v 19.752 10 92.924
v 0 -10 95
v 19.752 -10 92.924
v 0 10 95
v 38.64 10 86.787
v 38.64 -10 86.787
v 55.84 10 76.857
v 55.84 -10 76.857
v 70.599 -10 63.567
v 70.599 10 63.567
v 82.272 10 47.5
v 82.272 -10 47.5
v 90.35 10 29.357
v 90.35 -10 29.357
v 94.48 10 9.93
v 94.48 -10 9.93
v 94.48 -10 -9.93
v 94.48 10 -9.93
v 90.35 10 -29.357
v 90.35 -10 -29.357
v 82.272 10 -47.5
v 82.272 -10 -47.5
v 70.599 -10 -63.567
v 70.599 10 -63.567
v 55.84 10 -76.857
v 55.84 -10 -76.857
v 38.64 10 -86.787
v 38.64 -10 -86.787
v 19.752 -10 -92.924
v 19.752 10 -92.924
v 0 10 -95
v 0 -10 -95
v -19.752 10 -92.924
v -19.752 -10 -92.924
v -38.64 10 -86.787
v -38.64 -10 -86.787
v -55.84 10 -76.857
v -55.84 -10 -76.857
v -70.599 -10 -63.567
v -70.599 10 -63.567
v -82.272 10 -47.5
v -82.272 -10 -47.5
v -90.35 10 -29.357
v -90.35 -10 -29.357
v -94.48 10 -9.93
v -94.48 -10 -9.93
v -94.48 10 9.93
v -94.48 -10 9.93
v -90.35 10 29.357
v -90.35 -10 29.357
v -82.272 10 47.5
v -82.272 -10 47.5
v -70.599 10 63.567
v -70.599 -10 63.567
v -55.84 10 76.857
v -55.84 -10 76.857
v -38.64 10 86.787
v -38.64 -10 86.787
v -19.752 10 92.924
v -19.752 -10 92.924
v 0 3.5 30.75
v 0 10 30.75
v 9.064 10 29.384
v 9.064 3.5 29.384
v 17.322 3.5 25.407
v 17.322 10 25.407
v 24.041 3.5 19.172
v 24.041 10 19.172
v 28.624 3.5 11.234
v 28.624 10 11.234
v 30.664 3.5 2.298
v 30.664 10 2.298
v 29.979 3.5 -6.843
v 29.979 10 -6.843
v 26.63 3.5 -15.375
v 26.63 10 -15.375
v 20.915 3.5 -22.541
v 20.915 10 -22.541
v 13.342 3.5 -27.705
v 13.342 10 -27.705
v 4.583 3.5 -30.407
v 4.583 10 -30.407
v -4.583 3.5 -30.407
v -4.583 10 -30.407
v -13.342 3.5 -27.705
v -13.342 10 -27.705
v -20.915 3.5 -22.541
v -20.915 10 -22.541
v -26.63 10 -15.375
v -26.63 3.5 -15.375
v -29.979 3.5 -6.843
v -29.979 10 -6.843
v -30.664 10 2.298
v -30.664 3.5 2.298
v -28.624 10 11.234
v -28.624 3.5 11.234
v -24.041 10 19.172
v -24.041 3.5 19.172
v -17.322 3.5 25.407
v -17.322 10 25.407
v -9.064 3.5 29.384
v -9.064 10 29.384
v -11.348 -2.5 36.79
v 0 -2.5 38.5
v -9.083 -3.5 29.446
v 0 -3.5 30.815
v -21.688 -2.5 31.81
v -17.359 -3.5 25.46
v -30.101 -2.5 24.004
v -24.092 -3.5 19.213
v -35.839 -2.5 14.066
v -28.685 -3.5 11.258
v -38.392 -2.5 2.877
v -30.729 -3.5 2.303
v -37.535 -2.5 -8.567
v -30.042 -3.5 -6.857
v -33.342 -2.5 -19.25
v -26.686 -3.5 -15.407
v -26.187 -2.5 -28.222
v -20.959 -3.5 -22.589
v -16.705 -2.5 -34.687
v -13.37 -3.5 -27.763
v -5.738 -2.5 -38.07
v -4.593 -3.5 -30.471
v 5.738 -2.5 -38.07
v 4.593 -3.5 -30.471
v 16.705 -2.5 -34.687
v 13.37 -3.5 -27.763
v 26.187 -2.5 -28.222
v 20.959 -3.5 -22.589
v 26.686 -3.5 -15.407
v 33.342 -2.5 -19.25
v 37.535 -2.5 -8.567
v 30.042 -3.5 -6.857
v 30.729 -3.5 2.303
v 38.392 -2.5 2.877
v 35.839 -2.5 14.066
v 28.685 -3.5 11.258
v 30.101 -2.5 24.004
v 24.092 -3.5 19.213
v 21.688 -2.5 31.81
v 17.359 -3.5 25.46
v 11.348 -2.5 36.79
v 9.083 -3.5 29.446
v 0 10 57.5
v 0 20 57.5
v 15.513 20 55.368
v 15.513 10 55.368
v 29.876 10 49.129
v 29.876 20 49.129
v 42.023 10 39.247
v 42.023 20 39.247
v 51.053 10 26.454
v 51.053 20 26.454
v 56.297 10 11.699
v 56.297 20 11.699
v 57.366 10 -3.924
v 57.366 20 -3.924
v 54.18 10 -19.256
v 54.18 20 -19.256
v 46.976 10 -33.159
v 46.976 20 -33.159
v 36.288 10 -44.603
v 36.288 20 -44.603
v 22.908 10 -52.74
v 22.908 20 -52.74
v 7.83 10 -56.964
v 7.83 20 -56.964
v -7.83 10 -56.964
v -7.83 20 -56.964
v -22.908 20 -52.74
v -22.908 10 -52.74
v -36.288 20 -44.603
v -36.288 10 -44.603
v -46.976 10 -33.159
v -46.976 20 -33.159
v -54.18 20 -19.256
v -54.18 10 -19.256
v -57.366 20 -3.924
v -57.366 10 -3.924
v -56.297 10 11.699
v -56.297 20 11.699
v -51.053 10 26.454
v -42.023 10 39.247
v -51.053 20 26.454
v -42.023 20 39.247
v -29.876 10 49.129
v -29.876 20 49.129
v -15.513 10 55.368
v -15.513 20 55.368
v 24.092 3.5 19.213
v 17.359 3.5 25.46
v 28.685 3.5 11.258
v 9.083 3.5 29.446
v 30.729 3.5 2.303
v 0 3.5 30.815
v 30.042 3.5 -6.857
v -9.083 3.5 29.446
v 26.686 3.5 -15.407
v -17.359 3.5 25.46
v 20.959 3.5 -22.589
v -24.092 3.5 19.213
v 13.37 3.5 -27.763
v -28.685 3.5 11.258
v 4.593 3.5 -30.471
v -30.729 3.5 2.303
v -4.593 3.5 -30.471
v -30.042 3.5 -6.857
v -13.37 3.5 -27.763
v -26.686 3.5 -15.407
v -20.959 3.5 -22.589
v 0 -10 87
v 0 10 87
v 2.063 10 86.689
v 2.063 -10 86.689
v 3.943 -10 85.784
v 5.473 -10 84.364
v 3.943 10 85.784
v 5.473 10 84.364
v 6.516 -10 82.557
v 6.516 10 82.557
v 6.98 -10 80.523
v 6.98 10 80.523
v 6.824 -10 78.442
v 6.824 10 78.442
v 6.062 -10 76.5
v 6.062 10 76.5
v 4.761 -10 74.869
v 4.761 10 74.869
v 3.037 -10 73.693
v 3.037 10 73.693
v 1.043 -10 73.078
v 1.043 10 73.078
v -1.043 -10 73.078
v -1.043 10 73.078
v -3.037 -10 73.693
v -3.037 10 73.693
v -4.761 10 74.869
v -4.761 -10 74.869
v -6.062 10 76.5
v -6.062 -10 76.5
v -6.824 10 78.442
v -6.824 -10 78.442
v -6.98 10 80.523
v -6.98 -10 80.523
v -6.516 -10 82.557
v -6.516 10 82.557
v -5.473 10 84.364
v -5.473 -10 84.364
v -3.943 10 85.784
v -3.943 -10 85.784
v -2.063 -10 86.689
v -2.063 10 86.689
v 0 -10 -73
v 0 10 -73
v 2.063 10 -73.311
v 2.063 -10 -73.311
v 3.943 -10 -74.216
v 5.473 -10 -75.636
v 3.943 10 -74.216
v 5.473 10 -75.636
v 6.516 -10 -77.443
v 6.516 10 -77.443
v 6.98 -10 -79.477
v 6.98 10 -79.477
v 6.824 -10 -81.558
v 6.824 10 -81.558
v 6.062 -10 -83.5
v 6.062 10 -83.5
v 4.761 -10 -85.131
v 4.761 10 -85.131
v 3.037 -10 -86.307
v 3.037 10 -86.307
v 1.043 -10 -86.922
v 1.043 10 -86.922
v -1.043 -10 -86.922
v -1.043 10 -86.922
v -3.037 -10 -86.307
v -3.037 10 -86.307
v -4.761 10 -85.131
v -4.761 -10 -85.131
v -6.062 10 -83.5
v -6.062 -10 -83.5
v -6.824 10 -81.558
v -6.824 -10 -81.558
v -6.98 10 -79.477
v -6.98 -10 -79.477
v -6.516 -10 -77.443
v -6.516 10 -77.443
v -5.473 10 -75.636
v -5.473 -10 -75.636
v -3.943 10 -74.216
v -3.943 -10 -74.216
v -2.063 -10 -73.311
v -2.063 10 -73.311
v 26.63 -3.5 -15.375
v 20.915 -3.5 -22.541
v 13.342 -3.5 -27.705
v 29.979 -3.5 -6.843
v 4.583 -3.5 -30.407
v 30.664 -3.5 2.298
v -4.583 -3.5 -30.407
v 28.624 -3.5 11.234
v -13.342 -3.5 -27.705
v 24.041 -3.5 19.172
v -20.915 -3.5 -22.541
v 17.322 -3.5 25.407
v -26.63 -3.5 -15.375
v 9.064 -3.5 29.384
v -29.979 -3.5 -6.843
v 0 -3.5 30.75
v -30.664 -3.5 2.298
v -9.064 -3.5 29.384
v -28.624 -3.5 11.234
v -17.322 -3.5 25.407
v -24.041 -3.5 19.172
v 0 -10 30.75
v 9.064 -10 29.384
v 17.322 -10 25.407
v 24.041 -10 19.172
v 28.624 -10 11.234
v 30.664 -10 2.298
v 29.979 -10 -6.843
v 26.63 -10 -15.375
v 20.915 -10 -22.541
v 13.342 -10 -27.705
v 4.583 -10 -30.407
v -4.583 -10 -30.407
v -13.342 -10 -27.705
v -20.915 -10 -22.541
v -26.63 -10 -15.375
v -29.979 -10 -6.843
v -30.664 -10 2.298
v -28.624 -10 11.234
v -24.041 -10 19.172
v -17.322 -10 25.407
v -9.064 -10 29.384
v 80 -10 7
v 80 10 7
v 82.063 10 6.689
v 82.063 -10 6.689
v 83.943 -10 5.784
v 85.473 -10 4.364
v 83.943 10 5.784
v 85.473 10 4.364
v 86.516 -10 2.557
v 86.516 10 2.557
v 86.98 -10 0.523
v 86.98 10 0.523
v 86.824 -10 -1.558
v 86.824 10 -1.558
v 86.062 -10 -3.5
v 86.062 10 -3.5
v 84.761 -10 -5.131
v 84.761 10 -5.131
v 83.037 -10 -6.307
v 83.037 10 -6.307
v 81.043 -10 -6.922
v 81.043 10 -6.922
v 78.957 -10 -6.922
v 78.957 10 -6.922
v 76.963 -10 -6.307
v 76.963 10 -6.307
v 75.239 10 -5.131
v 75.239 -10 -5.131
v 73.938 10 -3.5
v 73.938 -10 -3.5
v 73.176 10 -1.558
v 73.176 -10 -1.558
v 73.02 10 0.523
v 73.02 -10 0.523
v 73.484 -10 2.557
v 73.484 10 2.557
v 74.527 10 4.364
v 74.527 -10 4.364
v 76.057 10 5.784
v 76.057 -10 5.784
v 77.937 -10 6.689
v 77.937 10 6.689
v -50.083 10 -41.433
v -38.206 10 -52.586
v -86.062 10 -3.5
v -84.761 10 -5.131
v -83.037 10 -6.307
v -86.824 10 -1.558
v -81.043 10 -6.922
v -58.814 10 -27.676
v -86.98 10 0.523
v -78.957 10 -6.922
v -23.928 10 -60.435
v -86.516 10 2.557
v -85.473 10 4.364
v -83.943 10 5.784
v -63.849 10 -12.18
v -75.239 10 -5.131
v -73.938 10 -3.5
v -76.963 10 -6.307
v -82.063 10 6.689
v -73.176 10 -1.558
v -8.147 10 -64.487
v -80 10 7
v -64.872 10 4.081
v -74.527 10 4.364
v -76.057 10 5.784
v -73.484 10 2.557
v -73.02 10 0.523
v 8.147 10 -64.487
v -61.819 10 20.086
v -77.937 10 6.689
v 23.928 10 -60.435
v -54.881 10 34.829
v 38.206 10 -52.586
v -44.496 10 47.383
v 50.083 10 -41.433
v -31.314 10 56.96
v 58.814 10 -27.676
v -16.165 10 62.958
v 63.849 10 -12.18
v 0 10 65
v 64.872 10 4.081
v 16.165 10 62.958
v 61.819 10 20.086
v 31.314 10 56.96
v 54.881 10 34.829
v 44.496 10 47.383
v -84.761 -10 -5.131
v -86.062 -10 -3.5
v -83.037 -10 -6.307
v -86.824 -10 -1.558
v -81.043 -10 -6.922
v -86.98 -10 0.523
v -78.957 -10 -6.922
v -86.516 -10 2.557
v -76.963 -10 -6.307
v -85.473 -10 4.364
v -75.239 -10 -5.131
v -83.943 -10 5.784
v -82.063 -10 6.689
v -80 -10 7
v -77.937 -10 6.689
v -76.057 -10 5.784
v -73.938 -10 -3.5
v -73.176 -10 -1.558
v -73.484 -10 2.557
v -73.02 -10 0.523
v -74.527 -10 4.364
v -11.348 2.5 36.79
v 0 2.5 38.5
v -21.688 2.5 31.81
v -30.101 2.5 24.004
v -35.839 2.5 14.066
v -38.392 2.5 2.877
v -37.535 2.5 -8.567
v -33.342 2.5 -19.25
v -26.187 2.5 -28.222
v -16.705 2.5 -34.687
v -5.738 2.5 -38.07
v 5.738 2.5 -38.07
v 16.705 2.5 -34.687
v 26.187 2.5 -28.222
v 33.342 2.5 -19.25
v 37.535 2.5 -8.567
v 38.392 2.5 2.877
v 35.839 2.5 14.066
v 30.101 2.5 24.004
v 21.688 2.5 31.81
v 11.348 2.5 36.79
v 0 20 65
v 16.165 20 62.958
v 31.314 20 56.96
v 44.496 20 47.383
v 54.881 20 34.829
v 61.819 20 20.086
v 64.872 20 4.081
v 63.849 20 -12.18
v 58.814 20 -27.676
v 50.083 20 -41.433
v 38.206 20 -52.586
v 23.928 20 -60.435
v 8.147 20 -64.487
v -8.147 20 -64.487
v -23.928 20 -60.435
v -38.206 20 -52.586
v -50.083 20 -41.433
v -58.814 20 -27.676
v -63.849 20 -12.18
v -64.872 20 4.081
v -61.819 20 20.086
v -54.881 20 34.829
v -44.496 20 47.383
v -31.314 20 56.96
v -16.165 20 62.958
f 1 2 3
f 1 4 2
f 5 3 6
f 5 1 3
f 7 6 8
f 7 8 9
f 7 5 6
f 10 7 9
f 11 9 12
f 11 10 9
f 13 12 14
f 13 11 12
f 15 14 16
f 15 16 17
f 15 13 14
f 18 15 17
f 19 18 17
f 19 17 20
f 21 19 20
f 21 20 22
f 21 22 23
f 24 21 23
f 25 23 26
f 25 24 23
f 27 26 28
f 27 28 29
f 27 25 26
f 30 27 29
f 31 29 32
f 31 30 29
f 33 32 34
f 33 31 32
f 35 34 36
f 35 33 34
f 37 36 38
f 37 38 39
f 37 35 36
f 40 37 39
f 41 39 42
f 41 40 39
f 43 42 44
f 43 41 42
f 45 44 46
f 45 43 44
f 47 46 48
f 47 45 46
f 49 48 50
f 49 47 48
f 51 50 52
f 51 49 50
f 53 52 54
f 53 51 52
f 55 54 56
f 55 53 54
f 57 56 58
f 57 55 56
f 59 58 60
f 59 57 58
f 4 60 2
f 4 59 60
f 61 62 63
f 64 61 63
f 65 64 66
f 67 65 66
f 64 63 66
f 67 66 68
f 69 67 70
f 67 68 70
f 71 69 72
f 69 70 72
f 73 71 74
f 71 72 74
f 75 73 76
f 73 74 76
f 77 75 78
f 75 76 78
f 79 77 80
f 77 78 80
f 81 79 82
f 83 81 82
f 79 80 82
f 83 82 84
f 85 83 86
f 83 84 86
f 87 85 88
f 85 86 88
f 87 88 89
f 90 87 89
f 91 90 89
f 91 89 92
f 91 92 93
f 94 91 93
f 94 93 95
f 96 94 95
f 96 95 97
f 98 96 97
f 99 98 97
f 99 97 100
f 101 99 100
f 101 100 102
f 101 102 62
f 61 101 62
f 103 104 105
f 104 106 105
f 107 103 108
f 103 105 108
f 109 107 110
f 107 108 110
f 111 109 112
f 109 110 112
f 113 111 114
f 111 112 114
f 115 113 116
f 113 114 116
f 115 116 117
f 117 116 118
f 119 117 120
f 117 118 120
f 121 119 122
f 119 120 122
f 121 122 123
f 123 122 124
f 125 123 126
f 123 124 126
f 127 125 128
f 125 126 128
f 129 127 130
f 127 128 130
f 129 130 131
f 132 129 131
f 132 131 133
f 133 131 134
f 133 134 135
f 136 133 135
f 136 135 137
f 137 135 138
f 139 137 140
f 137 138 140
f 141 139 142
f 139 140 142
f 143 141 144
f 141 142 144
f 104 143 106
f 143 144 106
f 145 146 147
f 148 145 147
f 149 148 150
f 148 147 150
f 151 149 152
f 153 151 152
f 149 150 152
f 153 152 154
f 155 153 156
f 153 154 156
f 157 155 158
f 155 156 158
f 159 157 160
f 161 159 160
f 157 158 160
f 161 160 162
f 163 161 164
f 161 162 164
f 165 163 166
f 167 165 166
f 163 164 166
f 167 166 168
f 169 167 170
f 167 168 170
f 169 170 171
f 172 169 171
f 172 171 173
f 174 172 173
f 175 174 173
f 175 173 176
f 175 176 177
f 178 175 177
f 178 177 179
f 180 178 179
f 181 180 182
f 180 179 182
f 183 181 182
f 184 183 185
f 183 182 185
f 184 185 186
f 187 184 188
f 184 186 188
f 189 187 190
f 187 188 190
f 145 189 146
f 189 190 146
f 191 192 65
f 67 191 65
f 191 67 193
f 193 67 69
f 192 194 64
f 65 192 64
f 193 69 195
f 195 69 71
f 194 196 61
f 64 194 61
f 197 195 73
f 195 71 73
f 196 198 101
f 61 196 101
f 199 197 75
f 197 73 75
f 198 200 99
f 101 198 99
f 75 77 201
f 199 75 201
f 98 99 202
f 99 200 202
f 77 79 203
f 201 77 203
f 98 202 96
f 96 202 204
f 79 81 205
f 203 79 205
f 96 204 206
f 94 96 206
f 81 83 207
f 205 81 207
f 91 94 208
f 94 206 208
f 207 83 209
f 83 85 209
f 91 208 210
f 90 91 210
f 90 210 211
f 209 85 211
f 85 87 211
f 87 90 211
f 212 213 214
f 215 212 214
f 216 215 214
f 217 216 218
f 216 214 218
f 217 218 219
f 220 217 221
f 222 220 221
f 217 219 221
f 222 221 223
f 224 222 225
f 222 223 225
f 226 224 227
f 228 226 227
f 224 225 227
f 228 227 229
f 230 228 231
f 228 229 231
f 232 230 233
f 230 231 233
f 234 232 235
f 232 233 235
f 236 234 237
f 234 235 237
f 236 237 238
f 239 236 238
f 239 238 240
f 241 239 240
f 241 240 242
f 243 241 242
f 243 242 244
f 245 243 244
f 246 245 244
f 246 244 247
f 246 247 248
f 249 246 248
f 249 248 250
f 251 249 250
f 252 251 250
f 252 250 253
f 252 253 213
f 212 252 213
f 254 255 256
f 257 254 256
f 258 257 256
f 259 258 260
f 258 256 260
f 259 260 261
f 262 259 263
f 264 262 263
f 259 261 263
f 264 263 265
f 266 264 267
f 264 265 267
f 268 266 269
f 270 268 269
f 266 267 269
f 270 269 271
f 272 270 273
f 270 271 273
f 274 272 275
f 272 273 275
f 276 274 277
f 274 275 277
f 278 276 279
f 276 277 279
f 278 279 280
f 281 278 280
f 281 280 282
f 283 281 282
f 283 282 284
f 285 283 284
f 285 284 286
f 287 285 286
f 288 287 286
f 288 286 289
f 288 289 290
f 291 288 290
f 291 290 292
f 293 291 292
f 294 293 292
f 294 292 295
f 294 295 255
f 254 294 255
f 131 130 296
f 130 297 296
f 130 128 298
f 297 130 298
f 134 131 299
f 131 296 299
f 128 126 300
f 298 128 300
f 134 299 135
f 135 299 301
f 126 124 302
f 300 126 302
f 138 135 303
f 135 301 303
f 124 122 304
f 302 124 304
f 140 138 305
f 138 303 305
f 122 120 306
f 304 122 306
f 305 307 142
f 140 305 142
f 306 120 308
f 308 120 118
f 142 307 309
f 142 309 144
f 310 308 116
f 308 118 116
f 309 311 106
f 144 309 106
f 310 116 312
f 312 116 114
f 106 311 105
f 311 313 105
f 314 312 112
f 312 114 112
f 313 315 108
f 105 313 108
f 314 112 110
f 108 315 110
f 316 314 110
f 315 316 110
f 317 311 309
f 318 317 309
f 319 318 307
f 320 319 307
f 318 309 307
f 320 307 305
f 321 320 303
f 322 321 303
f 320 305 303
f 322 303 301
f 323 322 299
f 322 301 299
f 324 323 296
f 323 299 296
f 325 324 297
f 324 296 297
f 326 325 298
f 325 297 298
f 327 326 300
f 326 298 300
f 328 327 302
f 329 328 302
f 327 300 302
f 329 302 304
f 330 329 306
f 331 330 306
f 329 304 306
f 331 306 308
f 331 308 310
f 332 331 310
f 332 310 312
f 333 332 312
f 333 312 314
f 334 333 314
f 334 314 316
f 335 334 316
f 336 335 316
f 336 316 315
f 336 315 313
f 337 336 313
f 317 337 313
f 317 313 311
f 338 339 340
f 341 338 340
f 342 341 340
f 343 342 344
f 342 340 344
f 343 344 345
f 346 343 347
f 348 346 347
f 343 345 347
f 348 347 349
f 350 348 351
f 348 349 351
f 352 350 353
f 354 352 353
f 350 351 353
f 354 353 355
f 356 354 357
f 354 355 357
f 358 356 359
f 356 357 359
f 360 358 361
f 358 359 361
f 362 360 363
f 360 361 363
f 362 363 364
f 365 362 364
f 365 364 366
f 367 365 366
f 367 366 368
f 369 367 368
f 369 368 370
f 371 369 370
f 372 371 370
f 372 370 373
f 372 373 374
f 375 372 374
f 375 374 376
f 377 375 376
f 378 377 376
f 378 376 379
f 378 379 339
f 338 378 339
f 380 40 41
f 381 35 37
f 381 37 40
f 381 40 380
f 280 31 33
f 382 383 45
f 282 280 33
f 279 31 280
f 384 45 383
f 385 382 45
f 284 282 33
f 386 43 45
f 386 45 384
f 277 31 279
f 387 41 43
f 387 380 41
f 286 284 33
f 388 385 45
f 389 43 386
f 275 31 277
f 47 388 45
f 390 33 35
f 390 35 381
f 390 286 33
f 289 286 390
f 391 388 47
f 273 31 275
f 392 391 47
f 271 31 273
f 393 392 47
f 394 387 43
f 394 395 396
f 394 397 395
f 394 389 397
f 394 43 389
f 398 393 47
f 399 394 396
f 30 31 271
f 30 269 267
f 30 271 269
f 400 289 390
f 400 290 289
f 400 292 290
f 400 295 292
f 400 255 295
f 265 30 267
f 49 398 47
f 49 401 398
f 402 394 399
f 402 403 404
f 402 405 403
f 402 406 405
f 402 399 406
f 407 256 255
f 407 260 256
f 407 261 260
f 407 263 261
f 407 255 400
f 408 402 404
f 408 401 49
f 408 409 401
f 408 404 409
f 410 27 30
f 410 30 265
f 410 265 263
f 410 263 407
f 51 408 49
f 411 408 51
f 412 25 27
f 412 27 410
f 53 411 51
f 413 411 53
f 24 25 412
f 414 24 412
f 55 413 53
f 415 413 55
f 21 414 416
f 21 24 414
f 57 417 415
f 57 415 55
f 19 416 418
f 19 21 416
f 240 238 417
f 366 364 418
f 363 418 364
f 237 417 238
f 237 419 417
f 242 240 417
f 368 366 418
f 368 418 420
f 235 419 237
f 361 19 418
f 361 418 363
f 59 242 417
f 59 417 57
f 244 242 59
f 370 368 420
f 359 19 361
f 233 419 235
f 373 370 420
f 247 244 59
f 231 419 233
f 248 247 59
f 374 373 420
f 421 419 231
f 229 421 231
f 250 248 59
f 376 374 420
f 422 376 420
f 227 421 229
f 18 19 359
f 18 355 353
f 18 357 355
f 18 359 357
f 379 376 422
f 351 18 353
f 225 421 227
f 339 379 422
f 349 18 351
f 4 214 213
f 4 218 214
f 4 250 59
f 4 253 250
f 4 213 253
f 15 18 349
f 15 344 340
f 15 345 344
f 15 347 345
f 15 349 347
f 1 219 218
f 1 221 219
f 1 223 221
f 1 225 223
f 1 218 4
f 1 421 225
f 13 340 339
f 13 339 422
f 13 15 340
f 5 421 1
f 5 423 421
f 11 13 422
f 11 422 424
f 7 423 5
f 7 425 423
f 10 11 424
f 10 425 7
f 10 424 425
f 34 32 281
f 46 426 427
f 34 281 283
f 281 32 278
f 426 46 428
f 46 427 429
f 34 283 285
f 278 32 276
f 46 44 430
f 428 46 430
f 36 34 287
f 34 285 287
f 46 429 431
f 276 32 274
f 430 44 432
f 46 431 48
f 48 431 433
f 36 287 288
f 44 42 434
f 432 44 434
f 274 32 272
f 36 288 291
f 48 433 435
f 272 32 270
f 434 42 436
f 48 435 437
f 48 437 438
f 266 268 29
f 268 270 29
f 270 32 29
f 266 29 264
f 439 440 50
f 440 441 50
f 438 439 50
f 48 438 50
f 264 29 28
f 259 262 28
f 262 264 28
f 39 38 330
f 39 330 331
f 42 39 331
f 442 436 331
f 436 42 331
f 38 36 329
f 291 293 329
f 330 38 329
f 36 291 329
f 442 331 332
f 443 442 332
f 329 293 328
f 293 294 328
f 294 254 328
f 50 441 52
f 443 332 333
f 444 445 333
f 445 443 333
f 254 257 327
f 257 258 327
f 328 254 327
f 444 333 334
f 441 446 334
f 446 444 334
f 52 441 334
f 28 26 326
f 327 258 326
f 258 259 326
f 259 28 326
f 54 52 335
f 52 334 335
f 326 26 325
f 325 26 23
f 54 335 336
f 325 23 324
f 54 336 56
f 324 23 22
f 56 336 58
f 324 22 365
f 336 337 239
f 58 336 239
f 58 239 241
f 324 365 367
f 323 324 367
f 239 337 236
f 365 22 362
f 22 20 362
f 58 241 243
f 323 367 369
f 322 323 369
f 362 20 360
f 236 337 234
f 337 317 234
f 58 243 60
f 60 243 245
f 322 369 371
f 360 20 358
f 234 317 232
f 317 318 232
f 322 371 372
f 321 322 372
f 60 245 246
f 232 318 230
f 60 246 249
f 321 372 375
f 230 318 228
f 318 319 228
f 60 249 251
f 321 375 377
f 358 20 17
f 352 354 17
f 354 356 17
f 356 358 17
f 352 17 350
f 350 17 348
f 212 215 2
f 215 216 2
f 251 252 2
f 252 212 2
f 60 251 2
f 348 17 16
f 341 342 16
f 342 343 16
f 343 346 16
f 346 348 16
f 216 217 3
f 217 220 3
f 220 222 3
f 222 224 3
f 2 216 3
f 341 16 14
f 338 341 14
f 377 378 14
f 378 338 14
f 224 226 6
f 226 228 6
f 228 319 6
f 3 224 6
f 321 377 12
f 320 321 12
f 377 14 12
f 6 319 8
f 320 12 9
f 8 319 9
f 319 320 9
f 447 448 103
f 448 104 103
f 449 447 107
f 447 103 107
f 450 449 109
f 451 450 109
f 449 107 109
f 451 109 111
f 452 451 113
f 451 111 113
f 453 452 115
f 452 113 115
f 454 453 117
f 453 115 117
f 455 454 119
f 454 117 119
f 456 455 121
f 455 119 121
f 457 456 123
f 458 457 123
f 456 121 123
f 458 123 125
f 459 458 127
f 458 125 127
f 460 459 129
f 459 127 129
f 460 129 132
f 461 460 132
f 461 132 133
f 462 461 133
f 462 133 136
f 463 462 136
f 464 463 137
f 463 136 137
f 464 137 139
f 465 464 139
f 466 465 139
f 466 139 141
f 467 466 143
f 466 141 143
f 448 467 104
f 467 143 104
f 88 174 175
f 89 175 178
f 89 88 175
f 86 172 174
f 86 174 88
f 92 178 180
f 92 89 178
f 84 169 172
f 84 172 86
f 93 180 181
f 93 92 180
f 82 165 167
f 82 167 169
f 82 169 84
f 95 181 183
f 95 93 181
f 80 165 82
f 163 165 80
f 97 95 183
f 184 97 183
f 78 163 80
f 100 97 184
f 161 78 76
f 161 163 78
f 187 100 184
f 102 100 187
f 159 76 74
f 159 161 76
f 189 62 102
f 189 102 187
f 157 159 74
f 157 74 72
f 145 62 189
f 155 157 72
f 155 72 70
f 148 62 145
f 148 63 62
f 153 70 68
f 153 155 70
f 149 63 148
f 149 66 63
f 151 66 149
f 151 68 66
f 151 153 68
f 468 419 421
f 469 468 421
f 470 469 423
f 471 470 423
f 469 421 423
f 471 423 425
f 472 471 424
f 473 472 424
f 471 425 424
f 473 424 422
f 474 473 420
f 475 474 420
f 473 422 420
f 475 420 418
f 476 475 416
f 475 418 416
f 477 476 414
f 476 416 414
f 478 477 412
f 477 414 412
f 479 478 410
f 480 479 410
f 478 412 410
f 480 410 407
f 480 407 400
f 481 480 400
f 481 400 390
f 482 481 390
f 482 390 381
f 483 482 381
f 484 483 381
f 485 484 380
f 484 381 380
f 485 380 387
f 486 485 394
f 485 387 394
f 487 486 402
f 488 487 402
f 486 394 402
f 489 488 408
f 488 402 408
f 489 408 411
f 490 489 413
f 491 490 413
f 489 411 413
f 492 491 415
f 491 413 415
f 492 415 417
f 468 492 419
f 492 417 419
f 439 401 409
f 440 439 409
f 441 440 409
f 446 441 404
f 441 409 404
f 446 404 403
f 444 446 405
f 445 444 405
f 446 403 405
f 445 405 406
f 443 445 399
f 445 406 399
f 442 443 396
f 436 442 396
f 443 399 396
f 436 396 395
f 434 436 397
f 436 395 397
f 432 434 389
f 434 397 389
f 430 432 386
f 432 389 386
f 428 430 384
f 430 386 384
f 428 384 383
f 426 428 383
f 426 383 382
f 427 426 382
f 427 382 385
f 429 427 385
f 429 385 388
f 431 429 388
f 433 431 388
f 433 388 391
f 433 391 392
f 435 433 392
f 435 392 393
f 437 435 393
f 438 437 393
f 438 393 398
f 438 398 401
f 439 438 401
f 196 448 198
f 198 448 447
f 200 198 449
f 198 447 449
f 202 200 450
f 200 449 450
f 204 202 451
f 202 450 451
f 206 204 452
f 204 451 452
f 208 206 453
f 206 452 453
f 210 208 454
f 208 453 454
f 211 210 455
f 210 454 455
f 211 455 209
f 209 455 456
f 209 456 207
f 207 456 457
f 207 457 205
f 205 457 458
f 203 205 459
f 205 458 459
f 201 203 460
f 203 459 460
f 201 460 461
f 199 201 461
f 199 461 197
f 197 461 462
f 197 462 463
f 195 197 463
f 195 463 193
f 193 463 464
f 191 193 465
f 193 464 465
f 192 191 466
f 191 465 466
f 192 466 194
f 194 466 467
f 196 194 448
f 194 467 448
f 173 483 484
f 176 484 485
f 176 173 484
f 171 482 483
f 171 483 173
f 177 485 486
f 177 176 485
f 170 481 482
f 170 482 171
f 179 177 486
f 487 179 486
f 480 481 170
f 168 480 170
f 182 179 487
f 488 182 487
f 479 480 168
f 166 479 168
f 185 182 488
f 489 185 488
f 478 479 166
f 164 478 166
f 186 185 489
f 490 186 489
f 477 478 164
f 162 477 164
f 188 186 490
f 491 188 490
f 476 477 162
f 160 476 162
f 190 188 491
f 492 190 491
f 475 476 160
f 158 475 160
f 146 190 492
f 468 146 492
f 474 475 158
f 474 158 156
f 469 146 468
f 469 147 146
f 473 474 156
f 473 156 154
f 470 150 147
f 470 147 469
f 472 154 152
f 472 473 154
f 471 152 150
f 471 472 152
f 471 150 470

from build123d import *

# Parameters (mm, degrees)
SKETCH1_R           = 95
BOSS_EXTRUDE1_DEPTH = 10
SKETCH2_R           = 65
BOSS_EXTRUDE2_DEPTH = 10
SKETCH3_R           = 57.5
CUT_EXTRUDE1_DEPTH  = 10
SKETCH4_R           = 7
CUT_EXTRUDE2_DEPTH  = 136.830777072
SKETCH5_R           = 30.75
CUT_EXTRUDE3_DEPTH  = 136.830777072


with BuildPart() as part:
    # Sketch1 → Boss-Extrude1 (new, symmetric)
    with BuildSketch(Plane(origin=(0, 0, 0), x_dir=(1, 0, 0), z_dir=(0, 1, 0))):
        with Locations(Location((0, 0, 0), (0, 0, 270))):
            Circle(SKETCH1_R)
    extrude(amount=BOSS_EXTRUDE1_DEPTH, both=True)

    # Sketch2 → Boss-Extrude2 (add)
    with BuildSketch(Plane(origin=(0, 10, 0), x_dir=(1, 0, 0), z_dir=(0, 1, 0))):
        with Locations(Location((0, 0, 0), (0, 0, 270))):
            Circle(SKETCH2_R)
    extrude(amount=BOSS_EXTRUDE2_DEPTH)

    # Sketch3 → Cut-Extrude1 (cut)
    with BuildSketch(Plane(origin=(0, 20, 0), x_dir=(1, 0, 0), z_dir=(0, 1, 0))):
        with Locations(Location((0, 0, 0), (0, 0, 270))):
            Circle(SKETCH3_R)
    extrude(amount=-CUT_EXTRUDE1_DEPTH, mode=Mode.SUBTRACT)

    # Sketch4 → Cut-Extrude2 (cut, through all)
    with BuildSketch(Plane(origin=(0, 10, 0), x_dir=(1, 0, 0), z_dir=(0, 1, 0))):
        with Locations(Location((0, 80, 0), (0, 0, 270))):
            Circle(SKETCH4_R)
        with Locations(Location((80, 0, 0), (0, 0, 270))):
            Circle(SKETCH4_R)
        with Locations(Location((0, -80, 0), (0, 0, 270))):
            Circle(SKETCH4_R)
        with Locations(Location((-80, 0, 0), (0, 0, 270))):
            Circle(SKETCH4_R)
    extrude(amount=-CUT_EXTRUDE2_DEPTH, mode=Mode.SUBTRACT)

    # Sketch5 → Cut-Extrude3 (cut, through all)
    with BuildSketch(Plane(origin=(0, 10, 0), x_dir=(1, 0, 0), z_dir=(0, 1, 0))):
        with Locations(Location((0, 0, 0), (0, 0, 270))):
            Circle(SKETCH5_R)
    extrude(amount=-CUT_EXTRUDE3_DEPTH, mode=Mode.SUBTRACT)

    # Sketch6 → Cut-Revolve3 (revolve, cut)
    with BuildSketch(Plane(origin=(0, 0, 0), x_dir=(0, 0, -1), z_dir=(1, 0, 0))):
        Polygon((0, 3.5), (-30.814786926, 3.5), (-38.5, 2.5), (-38.5, -2.5), (-30.814786926, -3.5), (0, -3.5), align=None)
    revolve(axis=Axis((0, 3.5, 0), (0, -1, 0)), mode=Mode.SUBTRACT)


solid = part.part
